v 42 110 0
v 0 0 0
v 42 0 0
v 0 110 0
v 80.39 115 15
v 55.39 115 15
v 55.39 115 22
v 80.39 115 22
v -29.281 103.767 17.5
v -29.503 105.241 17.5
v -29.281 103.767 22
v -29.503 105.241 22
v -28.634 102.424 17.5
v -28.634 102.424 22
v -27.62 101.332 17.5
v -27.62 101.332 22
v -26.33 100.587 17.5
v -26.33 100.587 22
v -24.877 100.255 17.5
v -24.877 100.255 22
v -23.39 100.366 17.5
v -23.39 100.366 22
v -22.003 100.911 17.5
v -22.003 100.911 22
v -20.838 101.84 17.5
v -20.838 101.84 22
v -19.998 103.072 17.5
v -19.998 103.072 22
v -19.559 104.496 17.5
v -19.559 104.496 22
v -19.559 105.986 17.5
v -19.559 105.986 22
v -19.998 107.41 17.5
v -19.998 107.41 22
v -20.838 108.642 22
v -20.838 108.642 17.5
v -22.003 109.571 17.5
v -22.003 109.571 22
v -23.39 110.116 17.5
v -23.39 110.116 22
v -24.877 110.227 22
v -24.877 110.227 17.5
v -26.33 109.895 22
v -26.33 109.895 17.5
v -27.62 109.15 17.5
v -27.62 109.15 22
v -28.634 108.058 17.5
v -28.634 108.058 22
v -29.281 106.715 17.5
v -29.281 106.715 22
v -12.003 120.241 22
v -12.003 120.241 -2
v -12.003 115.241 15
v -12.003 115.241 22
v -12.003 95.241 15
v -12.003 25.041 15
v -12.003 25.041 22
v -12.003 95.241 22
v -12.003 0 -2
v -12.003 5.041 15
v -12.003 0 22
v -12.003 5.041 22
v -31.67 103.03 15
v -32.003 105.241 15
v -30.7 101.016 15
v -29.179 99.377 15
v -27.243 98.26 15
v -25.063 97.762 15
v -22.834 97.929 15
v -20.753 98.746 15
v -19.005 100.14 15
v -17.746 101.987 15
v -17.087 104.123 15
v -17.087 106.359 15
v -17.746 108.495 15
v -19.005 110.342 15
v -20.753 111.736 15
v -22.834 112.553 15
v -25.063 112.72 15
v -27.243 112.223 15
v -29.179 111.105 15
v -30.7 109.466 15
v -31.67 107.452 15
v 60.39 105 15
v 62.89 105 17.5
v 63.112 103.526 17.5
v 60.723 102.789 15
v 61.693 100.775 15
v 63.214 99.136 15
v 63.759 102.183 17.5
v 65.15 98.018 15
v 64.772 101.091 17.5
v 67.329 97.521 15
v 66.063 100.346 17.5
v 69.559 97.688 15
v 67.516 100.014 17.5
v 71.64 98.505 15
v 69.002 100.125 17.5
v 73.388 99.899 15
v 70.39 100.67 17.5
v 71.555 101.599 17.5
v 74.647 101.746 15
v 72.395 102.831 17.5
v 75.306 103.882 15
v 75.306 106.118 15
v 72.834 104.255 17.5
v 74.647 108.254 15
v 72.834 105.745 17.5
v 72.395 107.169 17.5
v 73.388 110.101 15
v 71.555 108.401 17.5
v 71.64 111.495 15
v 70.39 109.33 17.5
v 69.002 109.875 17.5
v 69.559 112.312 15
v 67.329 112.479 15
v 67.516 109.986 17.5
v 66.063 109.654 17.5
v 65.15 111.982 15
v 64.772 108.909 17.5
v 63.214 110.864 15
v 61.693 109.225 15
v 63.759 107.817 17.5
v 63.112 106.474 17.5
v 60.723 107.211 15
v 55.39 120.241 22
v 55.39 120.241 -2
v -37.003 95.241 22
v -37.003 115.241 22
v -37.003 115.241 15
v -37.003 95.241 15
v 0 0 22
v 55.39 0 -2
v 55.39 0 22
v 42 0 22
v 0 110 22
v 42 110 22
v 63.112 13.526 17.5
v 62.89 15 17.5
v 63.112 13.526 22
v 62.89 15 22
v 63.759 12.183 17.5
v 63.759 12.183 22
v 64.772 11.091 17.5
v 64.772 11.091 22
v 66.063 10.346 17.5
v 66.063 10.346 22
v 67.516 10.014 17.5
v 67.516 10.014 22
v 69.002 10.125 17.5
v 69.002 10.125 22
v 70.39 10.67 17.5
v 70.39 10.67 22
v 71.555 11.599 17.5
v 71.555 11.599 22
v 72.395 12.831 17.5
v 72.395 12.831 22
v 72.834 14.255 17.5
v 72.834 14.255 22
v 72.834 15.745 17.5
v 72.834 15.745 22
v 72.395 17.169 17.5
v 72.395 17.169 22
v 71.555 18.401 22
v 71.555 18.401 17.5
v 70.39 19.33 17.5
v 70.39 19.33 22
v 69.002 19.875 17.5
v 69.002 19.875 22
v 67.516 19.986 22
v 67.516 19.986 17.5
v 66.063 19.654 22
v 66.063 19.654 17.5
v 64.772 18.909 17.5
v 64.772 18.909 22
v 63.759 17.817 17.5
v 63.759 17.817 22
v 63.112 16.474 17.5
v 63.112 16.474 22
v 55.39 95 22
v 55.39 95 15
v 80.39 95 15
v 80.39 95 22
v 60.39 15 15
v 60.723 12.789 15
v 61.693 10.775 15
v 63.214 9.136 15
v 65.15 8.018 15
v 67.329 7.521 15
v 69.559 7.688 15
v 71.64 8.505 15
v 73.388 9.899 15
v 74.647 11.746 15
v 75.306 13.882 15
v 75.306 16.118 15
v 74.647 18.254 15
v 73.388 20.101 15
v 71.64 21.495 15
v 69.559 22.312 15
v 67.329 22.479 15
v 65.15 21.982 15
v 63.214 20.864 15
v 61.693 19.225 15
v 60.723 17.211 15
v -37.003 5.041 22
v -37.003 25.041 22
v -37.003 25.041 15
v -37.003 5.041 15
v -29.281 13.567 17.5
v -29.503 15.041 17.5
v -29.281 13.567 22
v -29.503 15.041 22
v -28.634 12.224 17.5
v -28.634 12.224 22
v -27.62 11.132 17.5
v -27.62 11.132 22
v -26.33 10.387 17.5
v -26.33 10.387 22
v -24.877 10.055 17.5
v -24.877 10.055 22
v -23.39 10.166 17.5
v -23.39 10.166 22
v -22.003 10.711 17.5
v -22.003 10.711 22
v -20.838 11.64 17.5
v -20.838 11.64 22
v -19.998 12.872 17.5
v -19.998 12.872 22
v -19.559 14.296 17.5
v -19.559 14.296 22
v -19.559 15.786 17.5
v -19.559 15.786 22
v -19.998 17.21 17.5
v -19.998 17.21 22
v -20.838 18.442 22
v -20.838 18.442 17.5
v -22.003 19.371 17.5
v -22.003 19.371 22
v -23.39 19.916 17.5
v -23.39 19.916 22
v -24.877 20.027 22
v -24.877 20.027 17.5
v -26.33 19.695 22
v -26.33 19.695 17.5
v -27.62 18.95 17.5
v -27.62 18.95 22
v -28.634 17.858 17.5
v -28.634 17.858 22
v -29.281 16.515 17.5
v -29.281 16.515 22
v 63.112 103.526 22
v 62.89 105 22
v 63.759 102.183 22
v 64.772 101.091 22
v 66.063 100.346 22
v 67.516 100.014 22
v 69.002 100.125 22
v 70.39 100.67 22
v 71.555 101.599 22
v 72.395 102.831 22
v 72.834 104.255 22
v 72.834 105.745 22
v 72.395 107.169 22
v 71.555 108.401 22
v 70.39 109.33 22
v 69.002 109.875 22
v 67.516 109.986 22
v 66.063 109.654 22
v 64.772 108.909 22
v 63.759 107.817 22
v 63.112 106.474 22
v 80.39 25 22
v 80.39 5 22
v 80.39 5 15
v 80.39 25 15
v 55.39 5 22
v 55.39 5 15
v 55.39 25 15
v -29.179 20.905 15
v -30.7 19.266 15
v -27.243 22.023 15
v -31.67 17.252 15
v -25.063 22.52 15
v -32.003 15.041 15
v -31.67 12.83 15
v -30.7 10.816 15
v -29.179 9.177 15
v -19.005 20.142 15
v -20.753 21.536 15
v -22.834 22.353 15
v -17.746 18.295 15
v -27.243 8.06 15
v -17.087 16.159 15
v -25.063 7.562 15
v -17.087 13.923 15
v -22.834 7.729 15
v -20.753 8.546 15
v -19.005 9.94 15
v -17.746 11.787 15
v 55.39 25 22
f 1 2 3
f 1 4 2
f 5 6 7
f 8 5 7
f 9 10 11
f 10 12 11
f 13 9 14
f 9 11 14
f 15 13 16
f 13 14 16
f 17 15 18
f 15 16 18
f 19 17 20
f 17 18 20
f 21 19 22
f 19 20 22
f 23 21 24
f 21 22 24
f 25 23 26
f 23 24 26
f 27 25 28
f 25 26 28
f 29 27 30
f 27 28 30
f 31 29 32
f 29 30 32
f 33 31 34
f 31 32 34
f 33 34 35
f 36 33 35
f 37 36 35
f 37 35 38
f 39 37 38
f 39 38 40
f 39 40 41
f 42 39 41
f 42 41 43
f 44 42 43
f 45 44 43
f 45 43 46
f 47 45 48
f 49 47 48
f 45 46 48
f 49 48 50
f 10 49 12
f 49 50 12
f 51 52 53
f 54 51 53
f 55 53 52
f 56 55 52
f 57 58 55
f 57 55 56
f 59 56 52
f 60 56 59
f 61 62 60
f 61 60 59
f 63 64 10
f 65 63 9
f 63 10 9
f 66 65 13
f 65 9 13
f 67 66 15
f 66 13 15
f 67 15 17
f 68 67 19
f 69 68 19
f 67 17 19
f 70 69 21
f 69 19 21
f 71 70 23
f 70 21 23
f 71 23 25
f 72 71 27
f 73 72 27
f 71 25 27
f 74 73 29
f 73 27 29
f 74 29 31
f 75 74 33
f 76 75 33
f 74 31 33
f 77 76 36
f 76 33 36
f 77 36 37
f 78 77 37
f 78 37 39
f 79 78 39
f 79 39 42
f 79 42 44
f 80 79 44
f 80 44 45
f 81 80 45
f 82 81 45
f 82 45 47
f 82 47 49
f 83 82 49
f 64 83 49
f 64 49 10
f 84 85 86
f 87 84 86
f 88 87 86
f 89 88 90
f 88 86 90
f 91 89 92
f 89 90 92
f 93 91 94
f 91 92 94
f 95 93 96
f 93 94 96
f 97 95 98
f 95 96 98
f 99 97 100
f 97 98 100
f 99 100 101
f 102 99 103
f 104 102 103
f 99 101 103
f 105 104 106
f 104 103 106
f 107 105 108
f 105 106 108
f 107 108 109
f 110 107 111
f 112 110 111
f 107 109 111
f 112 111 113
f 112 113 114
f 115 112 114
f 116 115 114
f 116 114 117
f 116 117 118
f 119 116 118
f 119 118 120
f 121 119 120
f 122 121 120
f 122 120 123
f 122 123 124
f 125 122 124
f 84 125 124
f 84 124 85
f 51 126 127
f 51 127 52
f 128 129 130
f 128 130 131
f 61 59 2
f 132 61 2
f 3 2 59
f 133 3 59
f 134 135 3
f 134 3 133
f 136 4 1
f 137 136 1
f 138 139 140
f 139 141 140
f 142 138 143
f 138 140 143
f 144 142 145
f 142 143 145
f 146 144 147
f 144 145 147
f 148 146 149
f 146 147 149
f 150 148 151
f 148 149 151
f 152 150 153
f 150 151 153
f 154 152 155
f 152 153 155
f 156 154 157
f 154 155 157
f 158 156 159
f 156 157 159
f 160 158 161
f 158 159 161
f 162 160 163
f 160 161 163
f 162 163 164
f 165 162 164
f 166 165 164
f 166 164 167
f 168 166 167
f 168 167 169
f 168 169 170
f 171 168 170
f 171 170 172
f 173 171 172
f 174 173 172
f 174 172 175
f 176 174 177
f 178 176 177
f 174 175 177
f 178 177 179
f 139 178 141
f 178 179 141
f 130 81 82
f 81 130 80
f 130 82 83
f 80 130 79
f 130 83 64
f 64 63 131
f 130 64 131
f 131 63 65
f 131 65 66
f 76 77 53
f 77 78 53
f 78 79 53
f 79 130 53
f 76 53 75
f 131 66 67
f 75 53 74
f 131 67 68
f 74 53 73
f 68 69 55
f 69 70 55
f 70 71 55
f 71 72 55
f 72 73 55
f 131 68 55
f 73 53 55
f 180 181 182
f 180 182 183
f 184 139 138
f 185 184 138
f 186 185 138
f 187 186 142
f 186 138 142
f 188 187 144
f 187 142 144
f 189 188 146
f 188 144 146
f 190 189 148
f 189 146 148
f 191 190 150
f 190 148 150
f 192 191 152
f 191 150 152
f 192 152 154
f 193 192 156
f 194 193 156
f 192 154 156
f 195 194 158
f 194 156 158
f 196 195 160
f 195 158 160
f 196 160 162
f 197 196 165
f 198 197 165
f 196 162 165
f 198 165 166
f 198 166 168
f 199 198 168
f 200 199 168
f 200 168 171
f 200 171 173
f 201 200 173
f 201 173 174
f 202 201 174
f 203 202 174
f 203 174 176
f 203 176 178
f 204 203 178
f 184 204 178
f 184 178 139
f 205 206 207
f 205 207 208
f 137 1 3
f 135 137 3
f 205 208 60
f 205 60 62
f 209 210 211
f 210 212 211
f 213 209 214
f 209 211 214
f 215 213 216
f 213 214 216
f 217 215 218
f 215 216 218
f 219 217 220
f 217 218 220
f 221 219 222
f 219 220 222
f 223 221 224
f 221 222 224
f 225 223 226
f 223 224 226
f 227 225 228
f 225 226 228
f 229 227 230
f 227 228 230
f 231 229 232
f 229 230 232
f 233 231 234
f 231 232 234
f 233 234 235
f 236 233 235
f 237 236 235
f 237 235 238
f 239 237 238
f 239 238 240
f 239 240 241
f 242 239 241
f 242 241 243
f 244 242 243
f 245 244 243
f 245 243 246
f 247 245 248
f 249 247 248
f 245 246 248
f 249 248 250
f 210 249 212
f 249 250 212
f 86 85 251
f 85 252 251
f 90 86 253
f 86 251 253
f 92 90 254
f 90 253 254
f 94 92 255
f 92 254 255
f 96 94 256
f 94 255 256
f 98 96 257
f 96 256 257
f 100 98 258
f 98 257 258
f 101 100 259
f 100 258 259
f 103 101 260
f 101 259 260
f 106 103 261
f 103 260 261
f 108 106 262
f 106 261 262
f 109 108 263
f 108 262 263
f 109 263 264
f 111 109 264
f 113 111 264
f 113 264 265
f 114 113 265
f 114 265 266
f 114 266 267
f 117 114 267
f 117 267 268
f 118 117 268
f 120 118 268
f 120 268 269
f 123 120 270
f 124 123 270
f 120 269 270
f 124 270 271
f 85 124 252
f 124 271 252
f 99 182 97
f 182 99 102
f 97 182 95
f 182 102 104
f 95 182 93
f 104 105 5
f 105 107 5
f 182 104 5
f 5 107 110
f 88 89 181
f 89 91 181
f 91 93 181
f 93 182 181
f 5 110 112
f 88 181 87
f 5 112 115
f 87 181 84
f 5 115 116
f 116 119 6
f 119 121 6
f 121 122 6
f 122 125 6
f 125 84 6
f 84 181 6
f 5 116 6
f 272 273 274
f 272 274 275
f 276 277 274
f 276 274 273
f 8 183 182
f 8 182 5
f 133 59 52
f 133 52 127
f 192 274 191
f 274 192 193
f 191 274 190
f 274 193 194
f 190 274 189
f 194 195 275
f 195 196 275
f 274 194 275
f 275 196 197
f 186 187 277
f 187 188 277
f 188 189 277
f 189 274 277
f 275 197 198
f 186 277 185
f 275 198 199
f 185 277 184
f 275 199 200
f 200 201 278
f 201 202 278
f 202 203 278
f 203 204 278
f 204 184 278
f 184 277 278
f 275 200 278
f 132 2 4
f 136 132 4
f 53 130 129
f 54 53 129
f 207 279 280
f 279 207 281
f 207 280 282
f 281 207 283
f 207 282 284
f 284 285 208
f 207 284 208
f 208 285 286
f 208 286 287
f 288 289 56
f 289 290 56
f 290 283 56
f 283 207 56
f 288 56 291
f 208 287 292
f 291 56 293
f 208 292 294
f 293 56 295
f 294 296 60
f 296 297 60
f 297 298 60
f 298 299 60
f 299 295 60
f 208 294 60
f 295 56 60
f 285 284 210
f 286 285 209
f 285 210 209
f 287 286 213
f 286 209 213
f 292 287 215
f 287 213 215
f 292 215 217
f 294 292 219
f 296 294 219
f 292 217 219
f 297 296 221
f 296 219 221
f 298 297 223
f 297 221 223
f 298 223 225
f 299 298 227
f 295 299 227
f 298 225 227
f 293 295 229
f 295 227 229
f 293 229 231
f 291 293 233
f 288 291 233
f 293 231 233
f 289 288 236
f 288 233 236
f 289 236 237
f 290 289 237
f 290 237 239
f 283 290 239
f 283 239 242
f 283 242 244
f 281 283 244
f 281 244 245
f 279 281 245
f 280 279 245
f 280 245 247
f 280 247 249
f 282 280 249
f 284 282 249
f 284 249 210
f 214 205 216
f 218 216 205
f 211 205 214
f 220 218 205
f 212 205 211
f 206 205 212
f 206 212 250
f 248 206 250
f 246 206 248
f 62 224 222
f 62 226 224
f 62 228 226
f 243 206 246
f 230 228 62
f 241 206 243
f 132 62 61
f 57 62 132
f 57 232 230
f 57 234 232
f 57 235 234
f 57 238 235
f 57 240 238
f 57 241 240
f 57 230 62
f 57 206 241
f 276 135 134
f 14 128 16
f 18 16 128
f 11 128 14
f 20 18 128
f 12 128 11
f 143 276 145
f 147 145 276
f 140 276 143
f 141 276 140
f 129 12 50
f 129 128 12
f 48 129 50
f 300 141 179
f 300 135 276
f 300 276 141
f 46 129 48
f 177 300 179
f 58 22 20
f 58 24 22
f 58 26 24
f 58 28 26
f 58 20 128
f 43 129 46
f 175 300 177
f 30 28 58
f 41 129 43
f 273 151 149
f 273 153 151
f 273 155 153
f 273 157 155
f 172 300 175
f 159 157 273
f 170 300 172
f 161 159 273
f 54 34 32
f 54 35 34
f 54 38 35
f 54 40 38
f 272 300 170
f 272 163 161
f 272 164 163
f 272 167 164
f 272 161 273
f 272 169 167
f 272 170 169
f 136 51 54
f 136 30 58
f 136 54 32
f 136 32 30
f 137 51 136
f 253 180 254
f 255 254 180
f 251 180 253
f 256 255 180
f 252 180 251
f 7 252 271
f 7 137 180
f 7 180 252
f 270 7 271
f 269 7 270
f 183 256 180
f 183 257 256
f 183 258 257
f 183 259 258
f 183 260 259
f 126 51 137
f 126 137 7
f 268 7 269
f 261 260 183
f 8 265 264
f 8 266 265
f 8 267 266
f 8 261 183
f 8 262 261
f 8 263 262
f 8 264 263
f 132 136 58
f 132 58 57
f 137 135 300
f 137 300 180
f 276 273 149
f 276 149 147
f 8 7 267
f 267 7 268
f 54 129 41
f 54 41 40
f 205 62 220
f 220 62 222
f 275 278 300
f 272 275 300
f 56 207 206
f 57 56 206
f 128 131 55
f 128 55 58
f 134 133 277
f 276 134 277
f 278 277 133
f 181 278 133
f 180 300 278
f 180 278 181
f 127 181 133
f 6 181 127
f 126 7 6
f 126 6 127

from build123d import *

# Parameters (mm, degrees)
F1_DEPTH        = 22
F0_W            = 42
F0_H            = 110
F2_DEPTH        = 2
F3_W            = 20
F3_H            = 7
F4_DEPTH        = 25
F6_W            = 20
F6_H            = 7
F7_DEPTH        = 25
F9_D            = 10
F9_CSINK_D      = 15
F9_CSINK_ANGLE  = 90
F11_D           = 10
F11_CSINK_D     = 15
F11_CSINK_ANGLE = 90
F13_D           = 10
F13_CSINK_D     = 15
F13_CSINK_ANGLE = 90
F15_D           = 10
F15_CSINK_D     = 15
F15_CSINK_ANGLE = 90


with BuildPart() as f1:
    # F0 (on Top) → F1 (new body)
    with BuildSketch(Plane.XY):
        Polygon((-12.002976, 0), (0, 0), (0, 110), (42, 110), (42, 0), (55.389886, 0), (55.389886, 120.241073), (-12.002976, 120.241073), align=None)
    extrude(amount=F1_DEPTH)

    # F0 (on Top) → F2 (join)
    with BuildSketch(Plane.XY):
        with Locations((21, 55)):
            Rectangle(F0_W, F0_H)
        Polygon((-12.002976, 0), (0, 0), (0, 110), (42, 110), (42, 0), (55.389886, 0), (55.389886, 120.241073), (-12.002976, 120.241073), align=None)
    extrude(amount=-F2_DEPTH)

    # F3 (on face) → F4 (join)
    with BuildSketch(Plane.YZ.offset(55.389886)):
        with Locations((15, 18.5)):
            Rectangle(F3_W, F3_H)
        with Locations((105, 18.5)):
            Rectangle(F3_W, F3_H)
    extrude(amount=F4_DEPTH)

    # F6 (on face) → F7 (join)
    with BuildSketch(Plane(origin=(-12.002976, 0, 0), x_dir=(0, -1, 0), z_dir=(-1, 0, 0))):
        with Locations((-105.241073, 18.5)):
            Rectangle(F6_W, F6_H)
        with Locations((-15.041073, 18.5)):
            Rectangle(F6_W, F6_H)
    extrude(amount=F7_DEPTH)

    # F9 (through all)
    with Locations(Plane(origin=(0, 0, 15), x_dir=(1, 0, 0), z_dir=(0, 0, -1))):
        with Locations((67.889886, -105)):
            CounterSinkHole(F9_D / 2, F9_CSINK_D / 2, counter_sink_angle=F9_CSINK_ANGLE)

    # F11 (through all)
    with Locations(Plane(origin=(0, 0, 15), x_dir=(1, 0, 0), z_dir=(0, 0, -1))):
        with Locations((67.889886, -15)):
            CounterSinkHole(F11_D / 2, F11_CSINK_D / 2, counter_sink_angle=F11_CSINK_ANGLE)

    # F13 (through all)
    with Locations(Plane(origin=(0, 0, 15), x_dir=(1, 0, 0), z_dir=(0, 0, -1))):
        with Locations((-24.502976, -15.041073)):
            CounterSinkHole(F13_D / 2, F13_CSINK_D / 2, counter_sink_angle=F13_CSINK_ANGLE)

    # F15 (through all)
    with Locations(Plane(origin=(0, 0, 15), x_dir=(1, 0, 0), z_dir=(0, 0, -1))):
        with Locations((-24.502976, -105.241073)):
            CounterSinkHole(F15_D / 2, F15_CSINK_D / 2, counter_sink_angle=F15_CSINK_ANGLE)


solid = f1.part
